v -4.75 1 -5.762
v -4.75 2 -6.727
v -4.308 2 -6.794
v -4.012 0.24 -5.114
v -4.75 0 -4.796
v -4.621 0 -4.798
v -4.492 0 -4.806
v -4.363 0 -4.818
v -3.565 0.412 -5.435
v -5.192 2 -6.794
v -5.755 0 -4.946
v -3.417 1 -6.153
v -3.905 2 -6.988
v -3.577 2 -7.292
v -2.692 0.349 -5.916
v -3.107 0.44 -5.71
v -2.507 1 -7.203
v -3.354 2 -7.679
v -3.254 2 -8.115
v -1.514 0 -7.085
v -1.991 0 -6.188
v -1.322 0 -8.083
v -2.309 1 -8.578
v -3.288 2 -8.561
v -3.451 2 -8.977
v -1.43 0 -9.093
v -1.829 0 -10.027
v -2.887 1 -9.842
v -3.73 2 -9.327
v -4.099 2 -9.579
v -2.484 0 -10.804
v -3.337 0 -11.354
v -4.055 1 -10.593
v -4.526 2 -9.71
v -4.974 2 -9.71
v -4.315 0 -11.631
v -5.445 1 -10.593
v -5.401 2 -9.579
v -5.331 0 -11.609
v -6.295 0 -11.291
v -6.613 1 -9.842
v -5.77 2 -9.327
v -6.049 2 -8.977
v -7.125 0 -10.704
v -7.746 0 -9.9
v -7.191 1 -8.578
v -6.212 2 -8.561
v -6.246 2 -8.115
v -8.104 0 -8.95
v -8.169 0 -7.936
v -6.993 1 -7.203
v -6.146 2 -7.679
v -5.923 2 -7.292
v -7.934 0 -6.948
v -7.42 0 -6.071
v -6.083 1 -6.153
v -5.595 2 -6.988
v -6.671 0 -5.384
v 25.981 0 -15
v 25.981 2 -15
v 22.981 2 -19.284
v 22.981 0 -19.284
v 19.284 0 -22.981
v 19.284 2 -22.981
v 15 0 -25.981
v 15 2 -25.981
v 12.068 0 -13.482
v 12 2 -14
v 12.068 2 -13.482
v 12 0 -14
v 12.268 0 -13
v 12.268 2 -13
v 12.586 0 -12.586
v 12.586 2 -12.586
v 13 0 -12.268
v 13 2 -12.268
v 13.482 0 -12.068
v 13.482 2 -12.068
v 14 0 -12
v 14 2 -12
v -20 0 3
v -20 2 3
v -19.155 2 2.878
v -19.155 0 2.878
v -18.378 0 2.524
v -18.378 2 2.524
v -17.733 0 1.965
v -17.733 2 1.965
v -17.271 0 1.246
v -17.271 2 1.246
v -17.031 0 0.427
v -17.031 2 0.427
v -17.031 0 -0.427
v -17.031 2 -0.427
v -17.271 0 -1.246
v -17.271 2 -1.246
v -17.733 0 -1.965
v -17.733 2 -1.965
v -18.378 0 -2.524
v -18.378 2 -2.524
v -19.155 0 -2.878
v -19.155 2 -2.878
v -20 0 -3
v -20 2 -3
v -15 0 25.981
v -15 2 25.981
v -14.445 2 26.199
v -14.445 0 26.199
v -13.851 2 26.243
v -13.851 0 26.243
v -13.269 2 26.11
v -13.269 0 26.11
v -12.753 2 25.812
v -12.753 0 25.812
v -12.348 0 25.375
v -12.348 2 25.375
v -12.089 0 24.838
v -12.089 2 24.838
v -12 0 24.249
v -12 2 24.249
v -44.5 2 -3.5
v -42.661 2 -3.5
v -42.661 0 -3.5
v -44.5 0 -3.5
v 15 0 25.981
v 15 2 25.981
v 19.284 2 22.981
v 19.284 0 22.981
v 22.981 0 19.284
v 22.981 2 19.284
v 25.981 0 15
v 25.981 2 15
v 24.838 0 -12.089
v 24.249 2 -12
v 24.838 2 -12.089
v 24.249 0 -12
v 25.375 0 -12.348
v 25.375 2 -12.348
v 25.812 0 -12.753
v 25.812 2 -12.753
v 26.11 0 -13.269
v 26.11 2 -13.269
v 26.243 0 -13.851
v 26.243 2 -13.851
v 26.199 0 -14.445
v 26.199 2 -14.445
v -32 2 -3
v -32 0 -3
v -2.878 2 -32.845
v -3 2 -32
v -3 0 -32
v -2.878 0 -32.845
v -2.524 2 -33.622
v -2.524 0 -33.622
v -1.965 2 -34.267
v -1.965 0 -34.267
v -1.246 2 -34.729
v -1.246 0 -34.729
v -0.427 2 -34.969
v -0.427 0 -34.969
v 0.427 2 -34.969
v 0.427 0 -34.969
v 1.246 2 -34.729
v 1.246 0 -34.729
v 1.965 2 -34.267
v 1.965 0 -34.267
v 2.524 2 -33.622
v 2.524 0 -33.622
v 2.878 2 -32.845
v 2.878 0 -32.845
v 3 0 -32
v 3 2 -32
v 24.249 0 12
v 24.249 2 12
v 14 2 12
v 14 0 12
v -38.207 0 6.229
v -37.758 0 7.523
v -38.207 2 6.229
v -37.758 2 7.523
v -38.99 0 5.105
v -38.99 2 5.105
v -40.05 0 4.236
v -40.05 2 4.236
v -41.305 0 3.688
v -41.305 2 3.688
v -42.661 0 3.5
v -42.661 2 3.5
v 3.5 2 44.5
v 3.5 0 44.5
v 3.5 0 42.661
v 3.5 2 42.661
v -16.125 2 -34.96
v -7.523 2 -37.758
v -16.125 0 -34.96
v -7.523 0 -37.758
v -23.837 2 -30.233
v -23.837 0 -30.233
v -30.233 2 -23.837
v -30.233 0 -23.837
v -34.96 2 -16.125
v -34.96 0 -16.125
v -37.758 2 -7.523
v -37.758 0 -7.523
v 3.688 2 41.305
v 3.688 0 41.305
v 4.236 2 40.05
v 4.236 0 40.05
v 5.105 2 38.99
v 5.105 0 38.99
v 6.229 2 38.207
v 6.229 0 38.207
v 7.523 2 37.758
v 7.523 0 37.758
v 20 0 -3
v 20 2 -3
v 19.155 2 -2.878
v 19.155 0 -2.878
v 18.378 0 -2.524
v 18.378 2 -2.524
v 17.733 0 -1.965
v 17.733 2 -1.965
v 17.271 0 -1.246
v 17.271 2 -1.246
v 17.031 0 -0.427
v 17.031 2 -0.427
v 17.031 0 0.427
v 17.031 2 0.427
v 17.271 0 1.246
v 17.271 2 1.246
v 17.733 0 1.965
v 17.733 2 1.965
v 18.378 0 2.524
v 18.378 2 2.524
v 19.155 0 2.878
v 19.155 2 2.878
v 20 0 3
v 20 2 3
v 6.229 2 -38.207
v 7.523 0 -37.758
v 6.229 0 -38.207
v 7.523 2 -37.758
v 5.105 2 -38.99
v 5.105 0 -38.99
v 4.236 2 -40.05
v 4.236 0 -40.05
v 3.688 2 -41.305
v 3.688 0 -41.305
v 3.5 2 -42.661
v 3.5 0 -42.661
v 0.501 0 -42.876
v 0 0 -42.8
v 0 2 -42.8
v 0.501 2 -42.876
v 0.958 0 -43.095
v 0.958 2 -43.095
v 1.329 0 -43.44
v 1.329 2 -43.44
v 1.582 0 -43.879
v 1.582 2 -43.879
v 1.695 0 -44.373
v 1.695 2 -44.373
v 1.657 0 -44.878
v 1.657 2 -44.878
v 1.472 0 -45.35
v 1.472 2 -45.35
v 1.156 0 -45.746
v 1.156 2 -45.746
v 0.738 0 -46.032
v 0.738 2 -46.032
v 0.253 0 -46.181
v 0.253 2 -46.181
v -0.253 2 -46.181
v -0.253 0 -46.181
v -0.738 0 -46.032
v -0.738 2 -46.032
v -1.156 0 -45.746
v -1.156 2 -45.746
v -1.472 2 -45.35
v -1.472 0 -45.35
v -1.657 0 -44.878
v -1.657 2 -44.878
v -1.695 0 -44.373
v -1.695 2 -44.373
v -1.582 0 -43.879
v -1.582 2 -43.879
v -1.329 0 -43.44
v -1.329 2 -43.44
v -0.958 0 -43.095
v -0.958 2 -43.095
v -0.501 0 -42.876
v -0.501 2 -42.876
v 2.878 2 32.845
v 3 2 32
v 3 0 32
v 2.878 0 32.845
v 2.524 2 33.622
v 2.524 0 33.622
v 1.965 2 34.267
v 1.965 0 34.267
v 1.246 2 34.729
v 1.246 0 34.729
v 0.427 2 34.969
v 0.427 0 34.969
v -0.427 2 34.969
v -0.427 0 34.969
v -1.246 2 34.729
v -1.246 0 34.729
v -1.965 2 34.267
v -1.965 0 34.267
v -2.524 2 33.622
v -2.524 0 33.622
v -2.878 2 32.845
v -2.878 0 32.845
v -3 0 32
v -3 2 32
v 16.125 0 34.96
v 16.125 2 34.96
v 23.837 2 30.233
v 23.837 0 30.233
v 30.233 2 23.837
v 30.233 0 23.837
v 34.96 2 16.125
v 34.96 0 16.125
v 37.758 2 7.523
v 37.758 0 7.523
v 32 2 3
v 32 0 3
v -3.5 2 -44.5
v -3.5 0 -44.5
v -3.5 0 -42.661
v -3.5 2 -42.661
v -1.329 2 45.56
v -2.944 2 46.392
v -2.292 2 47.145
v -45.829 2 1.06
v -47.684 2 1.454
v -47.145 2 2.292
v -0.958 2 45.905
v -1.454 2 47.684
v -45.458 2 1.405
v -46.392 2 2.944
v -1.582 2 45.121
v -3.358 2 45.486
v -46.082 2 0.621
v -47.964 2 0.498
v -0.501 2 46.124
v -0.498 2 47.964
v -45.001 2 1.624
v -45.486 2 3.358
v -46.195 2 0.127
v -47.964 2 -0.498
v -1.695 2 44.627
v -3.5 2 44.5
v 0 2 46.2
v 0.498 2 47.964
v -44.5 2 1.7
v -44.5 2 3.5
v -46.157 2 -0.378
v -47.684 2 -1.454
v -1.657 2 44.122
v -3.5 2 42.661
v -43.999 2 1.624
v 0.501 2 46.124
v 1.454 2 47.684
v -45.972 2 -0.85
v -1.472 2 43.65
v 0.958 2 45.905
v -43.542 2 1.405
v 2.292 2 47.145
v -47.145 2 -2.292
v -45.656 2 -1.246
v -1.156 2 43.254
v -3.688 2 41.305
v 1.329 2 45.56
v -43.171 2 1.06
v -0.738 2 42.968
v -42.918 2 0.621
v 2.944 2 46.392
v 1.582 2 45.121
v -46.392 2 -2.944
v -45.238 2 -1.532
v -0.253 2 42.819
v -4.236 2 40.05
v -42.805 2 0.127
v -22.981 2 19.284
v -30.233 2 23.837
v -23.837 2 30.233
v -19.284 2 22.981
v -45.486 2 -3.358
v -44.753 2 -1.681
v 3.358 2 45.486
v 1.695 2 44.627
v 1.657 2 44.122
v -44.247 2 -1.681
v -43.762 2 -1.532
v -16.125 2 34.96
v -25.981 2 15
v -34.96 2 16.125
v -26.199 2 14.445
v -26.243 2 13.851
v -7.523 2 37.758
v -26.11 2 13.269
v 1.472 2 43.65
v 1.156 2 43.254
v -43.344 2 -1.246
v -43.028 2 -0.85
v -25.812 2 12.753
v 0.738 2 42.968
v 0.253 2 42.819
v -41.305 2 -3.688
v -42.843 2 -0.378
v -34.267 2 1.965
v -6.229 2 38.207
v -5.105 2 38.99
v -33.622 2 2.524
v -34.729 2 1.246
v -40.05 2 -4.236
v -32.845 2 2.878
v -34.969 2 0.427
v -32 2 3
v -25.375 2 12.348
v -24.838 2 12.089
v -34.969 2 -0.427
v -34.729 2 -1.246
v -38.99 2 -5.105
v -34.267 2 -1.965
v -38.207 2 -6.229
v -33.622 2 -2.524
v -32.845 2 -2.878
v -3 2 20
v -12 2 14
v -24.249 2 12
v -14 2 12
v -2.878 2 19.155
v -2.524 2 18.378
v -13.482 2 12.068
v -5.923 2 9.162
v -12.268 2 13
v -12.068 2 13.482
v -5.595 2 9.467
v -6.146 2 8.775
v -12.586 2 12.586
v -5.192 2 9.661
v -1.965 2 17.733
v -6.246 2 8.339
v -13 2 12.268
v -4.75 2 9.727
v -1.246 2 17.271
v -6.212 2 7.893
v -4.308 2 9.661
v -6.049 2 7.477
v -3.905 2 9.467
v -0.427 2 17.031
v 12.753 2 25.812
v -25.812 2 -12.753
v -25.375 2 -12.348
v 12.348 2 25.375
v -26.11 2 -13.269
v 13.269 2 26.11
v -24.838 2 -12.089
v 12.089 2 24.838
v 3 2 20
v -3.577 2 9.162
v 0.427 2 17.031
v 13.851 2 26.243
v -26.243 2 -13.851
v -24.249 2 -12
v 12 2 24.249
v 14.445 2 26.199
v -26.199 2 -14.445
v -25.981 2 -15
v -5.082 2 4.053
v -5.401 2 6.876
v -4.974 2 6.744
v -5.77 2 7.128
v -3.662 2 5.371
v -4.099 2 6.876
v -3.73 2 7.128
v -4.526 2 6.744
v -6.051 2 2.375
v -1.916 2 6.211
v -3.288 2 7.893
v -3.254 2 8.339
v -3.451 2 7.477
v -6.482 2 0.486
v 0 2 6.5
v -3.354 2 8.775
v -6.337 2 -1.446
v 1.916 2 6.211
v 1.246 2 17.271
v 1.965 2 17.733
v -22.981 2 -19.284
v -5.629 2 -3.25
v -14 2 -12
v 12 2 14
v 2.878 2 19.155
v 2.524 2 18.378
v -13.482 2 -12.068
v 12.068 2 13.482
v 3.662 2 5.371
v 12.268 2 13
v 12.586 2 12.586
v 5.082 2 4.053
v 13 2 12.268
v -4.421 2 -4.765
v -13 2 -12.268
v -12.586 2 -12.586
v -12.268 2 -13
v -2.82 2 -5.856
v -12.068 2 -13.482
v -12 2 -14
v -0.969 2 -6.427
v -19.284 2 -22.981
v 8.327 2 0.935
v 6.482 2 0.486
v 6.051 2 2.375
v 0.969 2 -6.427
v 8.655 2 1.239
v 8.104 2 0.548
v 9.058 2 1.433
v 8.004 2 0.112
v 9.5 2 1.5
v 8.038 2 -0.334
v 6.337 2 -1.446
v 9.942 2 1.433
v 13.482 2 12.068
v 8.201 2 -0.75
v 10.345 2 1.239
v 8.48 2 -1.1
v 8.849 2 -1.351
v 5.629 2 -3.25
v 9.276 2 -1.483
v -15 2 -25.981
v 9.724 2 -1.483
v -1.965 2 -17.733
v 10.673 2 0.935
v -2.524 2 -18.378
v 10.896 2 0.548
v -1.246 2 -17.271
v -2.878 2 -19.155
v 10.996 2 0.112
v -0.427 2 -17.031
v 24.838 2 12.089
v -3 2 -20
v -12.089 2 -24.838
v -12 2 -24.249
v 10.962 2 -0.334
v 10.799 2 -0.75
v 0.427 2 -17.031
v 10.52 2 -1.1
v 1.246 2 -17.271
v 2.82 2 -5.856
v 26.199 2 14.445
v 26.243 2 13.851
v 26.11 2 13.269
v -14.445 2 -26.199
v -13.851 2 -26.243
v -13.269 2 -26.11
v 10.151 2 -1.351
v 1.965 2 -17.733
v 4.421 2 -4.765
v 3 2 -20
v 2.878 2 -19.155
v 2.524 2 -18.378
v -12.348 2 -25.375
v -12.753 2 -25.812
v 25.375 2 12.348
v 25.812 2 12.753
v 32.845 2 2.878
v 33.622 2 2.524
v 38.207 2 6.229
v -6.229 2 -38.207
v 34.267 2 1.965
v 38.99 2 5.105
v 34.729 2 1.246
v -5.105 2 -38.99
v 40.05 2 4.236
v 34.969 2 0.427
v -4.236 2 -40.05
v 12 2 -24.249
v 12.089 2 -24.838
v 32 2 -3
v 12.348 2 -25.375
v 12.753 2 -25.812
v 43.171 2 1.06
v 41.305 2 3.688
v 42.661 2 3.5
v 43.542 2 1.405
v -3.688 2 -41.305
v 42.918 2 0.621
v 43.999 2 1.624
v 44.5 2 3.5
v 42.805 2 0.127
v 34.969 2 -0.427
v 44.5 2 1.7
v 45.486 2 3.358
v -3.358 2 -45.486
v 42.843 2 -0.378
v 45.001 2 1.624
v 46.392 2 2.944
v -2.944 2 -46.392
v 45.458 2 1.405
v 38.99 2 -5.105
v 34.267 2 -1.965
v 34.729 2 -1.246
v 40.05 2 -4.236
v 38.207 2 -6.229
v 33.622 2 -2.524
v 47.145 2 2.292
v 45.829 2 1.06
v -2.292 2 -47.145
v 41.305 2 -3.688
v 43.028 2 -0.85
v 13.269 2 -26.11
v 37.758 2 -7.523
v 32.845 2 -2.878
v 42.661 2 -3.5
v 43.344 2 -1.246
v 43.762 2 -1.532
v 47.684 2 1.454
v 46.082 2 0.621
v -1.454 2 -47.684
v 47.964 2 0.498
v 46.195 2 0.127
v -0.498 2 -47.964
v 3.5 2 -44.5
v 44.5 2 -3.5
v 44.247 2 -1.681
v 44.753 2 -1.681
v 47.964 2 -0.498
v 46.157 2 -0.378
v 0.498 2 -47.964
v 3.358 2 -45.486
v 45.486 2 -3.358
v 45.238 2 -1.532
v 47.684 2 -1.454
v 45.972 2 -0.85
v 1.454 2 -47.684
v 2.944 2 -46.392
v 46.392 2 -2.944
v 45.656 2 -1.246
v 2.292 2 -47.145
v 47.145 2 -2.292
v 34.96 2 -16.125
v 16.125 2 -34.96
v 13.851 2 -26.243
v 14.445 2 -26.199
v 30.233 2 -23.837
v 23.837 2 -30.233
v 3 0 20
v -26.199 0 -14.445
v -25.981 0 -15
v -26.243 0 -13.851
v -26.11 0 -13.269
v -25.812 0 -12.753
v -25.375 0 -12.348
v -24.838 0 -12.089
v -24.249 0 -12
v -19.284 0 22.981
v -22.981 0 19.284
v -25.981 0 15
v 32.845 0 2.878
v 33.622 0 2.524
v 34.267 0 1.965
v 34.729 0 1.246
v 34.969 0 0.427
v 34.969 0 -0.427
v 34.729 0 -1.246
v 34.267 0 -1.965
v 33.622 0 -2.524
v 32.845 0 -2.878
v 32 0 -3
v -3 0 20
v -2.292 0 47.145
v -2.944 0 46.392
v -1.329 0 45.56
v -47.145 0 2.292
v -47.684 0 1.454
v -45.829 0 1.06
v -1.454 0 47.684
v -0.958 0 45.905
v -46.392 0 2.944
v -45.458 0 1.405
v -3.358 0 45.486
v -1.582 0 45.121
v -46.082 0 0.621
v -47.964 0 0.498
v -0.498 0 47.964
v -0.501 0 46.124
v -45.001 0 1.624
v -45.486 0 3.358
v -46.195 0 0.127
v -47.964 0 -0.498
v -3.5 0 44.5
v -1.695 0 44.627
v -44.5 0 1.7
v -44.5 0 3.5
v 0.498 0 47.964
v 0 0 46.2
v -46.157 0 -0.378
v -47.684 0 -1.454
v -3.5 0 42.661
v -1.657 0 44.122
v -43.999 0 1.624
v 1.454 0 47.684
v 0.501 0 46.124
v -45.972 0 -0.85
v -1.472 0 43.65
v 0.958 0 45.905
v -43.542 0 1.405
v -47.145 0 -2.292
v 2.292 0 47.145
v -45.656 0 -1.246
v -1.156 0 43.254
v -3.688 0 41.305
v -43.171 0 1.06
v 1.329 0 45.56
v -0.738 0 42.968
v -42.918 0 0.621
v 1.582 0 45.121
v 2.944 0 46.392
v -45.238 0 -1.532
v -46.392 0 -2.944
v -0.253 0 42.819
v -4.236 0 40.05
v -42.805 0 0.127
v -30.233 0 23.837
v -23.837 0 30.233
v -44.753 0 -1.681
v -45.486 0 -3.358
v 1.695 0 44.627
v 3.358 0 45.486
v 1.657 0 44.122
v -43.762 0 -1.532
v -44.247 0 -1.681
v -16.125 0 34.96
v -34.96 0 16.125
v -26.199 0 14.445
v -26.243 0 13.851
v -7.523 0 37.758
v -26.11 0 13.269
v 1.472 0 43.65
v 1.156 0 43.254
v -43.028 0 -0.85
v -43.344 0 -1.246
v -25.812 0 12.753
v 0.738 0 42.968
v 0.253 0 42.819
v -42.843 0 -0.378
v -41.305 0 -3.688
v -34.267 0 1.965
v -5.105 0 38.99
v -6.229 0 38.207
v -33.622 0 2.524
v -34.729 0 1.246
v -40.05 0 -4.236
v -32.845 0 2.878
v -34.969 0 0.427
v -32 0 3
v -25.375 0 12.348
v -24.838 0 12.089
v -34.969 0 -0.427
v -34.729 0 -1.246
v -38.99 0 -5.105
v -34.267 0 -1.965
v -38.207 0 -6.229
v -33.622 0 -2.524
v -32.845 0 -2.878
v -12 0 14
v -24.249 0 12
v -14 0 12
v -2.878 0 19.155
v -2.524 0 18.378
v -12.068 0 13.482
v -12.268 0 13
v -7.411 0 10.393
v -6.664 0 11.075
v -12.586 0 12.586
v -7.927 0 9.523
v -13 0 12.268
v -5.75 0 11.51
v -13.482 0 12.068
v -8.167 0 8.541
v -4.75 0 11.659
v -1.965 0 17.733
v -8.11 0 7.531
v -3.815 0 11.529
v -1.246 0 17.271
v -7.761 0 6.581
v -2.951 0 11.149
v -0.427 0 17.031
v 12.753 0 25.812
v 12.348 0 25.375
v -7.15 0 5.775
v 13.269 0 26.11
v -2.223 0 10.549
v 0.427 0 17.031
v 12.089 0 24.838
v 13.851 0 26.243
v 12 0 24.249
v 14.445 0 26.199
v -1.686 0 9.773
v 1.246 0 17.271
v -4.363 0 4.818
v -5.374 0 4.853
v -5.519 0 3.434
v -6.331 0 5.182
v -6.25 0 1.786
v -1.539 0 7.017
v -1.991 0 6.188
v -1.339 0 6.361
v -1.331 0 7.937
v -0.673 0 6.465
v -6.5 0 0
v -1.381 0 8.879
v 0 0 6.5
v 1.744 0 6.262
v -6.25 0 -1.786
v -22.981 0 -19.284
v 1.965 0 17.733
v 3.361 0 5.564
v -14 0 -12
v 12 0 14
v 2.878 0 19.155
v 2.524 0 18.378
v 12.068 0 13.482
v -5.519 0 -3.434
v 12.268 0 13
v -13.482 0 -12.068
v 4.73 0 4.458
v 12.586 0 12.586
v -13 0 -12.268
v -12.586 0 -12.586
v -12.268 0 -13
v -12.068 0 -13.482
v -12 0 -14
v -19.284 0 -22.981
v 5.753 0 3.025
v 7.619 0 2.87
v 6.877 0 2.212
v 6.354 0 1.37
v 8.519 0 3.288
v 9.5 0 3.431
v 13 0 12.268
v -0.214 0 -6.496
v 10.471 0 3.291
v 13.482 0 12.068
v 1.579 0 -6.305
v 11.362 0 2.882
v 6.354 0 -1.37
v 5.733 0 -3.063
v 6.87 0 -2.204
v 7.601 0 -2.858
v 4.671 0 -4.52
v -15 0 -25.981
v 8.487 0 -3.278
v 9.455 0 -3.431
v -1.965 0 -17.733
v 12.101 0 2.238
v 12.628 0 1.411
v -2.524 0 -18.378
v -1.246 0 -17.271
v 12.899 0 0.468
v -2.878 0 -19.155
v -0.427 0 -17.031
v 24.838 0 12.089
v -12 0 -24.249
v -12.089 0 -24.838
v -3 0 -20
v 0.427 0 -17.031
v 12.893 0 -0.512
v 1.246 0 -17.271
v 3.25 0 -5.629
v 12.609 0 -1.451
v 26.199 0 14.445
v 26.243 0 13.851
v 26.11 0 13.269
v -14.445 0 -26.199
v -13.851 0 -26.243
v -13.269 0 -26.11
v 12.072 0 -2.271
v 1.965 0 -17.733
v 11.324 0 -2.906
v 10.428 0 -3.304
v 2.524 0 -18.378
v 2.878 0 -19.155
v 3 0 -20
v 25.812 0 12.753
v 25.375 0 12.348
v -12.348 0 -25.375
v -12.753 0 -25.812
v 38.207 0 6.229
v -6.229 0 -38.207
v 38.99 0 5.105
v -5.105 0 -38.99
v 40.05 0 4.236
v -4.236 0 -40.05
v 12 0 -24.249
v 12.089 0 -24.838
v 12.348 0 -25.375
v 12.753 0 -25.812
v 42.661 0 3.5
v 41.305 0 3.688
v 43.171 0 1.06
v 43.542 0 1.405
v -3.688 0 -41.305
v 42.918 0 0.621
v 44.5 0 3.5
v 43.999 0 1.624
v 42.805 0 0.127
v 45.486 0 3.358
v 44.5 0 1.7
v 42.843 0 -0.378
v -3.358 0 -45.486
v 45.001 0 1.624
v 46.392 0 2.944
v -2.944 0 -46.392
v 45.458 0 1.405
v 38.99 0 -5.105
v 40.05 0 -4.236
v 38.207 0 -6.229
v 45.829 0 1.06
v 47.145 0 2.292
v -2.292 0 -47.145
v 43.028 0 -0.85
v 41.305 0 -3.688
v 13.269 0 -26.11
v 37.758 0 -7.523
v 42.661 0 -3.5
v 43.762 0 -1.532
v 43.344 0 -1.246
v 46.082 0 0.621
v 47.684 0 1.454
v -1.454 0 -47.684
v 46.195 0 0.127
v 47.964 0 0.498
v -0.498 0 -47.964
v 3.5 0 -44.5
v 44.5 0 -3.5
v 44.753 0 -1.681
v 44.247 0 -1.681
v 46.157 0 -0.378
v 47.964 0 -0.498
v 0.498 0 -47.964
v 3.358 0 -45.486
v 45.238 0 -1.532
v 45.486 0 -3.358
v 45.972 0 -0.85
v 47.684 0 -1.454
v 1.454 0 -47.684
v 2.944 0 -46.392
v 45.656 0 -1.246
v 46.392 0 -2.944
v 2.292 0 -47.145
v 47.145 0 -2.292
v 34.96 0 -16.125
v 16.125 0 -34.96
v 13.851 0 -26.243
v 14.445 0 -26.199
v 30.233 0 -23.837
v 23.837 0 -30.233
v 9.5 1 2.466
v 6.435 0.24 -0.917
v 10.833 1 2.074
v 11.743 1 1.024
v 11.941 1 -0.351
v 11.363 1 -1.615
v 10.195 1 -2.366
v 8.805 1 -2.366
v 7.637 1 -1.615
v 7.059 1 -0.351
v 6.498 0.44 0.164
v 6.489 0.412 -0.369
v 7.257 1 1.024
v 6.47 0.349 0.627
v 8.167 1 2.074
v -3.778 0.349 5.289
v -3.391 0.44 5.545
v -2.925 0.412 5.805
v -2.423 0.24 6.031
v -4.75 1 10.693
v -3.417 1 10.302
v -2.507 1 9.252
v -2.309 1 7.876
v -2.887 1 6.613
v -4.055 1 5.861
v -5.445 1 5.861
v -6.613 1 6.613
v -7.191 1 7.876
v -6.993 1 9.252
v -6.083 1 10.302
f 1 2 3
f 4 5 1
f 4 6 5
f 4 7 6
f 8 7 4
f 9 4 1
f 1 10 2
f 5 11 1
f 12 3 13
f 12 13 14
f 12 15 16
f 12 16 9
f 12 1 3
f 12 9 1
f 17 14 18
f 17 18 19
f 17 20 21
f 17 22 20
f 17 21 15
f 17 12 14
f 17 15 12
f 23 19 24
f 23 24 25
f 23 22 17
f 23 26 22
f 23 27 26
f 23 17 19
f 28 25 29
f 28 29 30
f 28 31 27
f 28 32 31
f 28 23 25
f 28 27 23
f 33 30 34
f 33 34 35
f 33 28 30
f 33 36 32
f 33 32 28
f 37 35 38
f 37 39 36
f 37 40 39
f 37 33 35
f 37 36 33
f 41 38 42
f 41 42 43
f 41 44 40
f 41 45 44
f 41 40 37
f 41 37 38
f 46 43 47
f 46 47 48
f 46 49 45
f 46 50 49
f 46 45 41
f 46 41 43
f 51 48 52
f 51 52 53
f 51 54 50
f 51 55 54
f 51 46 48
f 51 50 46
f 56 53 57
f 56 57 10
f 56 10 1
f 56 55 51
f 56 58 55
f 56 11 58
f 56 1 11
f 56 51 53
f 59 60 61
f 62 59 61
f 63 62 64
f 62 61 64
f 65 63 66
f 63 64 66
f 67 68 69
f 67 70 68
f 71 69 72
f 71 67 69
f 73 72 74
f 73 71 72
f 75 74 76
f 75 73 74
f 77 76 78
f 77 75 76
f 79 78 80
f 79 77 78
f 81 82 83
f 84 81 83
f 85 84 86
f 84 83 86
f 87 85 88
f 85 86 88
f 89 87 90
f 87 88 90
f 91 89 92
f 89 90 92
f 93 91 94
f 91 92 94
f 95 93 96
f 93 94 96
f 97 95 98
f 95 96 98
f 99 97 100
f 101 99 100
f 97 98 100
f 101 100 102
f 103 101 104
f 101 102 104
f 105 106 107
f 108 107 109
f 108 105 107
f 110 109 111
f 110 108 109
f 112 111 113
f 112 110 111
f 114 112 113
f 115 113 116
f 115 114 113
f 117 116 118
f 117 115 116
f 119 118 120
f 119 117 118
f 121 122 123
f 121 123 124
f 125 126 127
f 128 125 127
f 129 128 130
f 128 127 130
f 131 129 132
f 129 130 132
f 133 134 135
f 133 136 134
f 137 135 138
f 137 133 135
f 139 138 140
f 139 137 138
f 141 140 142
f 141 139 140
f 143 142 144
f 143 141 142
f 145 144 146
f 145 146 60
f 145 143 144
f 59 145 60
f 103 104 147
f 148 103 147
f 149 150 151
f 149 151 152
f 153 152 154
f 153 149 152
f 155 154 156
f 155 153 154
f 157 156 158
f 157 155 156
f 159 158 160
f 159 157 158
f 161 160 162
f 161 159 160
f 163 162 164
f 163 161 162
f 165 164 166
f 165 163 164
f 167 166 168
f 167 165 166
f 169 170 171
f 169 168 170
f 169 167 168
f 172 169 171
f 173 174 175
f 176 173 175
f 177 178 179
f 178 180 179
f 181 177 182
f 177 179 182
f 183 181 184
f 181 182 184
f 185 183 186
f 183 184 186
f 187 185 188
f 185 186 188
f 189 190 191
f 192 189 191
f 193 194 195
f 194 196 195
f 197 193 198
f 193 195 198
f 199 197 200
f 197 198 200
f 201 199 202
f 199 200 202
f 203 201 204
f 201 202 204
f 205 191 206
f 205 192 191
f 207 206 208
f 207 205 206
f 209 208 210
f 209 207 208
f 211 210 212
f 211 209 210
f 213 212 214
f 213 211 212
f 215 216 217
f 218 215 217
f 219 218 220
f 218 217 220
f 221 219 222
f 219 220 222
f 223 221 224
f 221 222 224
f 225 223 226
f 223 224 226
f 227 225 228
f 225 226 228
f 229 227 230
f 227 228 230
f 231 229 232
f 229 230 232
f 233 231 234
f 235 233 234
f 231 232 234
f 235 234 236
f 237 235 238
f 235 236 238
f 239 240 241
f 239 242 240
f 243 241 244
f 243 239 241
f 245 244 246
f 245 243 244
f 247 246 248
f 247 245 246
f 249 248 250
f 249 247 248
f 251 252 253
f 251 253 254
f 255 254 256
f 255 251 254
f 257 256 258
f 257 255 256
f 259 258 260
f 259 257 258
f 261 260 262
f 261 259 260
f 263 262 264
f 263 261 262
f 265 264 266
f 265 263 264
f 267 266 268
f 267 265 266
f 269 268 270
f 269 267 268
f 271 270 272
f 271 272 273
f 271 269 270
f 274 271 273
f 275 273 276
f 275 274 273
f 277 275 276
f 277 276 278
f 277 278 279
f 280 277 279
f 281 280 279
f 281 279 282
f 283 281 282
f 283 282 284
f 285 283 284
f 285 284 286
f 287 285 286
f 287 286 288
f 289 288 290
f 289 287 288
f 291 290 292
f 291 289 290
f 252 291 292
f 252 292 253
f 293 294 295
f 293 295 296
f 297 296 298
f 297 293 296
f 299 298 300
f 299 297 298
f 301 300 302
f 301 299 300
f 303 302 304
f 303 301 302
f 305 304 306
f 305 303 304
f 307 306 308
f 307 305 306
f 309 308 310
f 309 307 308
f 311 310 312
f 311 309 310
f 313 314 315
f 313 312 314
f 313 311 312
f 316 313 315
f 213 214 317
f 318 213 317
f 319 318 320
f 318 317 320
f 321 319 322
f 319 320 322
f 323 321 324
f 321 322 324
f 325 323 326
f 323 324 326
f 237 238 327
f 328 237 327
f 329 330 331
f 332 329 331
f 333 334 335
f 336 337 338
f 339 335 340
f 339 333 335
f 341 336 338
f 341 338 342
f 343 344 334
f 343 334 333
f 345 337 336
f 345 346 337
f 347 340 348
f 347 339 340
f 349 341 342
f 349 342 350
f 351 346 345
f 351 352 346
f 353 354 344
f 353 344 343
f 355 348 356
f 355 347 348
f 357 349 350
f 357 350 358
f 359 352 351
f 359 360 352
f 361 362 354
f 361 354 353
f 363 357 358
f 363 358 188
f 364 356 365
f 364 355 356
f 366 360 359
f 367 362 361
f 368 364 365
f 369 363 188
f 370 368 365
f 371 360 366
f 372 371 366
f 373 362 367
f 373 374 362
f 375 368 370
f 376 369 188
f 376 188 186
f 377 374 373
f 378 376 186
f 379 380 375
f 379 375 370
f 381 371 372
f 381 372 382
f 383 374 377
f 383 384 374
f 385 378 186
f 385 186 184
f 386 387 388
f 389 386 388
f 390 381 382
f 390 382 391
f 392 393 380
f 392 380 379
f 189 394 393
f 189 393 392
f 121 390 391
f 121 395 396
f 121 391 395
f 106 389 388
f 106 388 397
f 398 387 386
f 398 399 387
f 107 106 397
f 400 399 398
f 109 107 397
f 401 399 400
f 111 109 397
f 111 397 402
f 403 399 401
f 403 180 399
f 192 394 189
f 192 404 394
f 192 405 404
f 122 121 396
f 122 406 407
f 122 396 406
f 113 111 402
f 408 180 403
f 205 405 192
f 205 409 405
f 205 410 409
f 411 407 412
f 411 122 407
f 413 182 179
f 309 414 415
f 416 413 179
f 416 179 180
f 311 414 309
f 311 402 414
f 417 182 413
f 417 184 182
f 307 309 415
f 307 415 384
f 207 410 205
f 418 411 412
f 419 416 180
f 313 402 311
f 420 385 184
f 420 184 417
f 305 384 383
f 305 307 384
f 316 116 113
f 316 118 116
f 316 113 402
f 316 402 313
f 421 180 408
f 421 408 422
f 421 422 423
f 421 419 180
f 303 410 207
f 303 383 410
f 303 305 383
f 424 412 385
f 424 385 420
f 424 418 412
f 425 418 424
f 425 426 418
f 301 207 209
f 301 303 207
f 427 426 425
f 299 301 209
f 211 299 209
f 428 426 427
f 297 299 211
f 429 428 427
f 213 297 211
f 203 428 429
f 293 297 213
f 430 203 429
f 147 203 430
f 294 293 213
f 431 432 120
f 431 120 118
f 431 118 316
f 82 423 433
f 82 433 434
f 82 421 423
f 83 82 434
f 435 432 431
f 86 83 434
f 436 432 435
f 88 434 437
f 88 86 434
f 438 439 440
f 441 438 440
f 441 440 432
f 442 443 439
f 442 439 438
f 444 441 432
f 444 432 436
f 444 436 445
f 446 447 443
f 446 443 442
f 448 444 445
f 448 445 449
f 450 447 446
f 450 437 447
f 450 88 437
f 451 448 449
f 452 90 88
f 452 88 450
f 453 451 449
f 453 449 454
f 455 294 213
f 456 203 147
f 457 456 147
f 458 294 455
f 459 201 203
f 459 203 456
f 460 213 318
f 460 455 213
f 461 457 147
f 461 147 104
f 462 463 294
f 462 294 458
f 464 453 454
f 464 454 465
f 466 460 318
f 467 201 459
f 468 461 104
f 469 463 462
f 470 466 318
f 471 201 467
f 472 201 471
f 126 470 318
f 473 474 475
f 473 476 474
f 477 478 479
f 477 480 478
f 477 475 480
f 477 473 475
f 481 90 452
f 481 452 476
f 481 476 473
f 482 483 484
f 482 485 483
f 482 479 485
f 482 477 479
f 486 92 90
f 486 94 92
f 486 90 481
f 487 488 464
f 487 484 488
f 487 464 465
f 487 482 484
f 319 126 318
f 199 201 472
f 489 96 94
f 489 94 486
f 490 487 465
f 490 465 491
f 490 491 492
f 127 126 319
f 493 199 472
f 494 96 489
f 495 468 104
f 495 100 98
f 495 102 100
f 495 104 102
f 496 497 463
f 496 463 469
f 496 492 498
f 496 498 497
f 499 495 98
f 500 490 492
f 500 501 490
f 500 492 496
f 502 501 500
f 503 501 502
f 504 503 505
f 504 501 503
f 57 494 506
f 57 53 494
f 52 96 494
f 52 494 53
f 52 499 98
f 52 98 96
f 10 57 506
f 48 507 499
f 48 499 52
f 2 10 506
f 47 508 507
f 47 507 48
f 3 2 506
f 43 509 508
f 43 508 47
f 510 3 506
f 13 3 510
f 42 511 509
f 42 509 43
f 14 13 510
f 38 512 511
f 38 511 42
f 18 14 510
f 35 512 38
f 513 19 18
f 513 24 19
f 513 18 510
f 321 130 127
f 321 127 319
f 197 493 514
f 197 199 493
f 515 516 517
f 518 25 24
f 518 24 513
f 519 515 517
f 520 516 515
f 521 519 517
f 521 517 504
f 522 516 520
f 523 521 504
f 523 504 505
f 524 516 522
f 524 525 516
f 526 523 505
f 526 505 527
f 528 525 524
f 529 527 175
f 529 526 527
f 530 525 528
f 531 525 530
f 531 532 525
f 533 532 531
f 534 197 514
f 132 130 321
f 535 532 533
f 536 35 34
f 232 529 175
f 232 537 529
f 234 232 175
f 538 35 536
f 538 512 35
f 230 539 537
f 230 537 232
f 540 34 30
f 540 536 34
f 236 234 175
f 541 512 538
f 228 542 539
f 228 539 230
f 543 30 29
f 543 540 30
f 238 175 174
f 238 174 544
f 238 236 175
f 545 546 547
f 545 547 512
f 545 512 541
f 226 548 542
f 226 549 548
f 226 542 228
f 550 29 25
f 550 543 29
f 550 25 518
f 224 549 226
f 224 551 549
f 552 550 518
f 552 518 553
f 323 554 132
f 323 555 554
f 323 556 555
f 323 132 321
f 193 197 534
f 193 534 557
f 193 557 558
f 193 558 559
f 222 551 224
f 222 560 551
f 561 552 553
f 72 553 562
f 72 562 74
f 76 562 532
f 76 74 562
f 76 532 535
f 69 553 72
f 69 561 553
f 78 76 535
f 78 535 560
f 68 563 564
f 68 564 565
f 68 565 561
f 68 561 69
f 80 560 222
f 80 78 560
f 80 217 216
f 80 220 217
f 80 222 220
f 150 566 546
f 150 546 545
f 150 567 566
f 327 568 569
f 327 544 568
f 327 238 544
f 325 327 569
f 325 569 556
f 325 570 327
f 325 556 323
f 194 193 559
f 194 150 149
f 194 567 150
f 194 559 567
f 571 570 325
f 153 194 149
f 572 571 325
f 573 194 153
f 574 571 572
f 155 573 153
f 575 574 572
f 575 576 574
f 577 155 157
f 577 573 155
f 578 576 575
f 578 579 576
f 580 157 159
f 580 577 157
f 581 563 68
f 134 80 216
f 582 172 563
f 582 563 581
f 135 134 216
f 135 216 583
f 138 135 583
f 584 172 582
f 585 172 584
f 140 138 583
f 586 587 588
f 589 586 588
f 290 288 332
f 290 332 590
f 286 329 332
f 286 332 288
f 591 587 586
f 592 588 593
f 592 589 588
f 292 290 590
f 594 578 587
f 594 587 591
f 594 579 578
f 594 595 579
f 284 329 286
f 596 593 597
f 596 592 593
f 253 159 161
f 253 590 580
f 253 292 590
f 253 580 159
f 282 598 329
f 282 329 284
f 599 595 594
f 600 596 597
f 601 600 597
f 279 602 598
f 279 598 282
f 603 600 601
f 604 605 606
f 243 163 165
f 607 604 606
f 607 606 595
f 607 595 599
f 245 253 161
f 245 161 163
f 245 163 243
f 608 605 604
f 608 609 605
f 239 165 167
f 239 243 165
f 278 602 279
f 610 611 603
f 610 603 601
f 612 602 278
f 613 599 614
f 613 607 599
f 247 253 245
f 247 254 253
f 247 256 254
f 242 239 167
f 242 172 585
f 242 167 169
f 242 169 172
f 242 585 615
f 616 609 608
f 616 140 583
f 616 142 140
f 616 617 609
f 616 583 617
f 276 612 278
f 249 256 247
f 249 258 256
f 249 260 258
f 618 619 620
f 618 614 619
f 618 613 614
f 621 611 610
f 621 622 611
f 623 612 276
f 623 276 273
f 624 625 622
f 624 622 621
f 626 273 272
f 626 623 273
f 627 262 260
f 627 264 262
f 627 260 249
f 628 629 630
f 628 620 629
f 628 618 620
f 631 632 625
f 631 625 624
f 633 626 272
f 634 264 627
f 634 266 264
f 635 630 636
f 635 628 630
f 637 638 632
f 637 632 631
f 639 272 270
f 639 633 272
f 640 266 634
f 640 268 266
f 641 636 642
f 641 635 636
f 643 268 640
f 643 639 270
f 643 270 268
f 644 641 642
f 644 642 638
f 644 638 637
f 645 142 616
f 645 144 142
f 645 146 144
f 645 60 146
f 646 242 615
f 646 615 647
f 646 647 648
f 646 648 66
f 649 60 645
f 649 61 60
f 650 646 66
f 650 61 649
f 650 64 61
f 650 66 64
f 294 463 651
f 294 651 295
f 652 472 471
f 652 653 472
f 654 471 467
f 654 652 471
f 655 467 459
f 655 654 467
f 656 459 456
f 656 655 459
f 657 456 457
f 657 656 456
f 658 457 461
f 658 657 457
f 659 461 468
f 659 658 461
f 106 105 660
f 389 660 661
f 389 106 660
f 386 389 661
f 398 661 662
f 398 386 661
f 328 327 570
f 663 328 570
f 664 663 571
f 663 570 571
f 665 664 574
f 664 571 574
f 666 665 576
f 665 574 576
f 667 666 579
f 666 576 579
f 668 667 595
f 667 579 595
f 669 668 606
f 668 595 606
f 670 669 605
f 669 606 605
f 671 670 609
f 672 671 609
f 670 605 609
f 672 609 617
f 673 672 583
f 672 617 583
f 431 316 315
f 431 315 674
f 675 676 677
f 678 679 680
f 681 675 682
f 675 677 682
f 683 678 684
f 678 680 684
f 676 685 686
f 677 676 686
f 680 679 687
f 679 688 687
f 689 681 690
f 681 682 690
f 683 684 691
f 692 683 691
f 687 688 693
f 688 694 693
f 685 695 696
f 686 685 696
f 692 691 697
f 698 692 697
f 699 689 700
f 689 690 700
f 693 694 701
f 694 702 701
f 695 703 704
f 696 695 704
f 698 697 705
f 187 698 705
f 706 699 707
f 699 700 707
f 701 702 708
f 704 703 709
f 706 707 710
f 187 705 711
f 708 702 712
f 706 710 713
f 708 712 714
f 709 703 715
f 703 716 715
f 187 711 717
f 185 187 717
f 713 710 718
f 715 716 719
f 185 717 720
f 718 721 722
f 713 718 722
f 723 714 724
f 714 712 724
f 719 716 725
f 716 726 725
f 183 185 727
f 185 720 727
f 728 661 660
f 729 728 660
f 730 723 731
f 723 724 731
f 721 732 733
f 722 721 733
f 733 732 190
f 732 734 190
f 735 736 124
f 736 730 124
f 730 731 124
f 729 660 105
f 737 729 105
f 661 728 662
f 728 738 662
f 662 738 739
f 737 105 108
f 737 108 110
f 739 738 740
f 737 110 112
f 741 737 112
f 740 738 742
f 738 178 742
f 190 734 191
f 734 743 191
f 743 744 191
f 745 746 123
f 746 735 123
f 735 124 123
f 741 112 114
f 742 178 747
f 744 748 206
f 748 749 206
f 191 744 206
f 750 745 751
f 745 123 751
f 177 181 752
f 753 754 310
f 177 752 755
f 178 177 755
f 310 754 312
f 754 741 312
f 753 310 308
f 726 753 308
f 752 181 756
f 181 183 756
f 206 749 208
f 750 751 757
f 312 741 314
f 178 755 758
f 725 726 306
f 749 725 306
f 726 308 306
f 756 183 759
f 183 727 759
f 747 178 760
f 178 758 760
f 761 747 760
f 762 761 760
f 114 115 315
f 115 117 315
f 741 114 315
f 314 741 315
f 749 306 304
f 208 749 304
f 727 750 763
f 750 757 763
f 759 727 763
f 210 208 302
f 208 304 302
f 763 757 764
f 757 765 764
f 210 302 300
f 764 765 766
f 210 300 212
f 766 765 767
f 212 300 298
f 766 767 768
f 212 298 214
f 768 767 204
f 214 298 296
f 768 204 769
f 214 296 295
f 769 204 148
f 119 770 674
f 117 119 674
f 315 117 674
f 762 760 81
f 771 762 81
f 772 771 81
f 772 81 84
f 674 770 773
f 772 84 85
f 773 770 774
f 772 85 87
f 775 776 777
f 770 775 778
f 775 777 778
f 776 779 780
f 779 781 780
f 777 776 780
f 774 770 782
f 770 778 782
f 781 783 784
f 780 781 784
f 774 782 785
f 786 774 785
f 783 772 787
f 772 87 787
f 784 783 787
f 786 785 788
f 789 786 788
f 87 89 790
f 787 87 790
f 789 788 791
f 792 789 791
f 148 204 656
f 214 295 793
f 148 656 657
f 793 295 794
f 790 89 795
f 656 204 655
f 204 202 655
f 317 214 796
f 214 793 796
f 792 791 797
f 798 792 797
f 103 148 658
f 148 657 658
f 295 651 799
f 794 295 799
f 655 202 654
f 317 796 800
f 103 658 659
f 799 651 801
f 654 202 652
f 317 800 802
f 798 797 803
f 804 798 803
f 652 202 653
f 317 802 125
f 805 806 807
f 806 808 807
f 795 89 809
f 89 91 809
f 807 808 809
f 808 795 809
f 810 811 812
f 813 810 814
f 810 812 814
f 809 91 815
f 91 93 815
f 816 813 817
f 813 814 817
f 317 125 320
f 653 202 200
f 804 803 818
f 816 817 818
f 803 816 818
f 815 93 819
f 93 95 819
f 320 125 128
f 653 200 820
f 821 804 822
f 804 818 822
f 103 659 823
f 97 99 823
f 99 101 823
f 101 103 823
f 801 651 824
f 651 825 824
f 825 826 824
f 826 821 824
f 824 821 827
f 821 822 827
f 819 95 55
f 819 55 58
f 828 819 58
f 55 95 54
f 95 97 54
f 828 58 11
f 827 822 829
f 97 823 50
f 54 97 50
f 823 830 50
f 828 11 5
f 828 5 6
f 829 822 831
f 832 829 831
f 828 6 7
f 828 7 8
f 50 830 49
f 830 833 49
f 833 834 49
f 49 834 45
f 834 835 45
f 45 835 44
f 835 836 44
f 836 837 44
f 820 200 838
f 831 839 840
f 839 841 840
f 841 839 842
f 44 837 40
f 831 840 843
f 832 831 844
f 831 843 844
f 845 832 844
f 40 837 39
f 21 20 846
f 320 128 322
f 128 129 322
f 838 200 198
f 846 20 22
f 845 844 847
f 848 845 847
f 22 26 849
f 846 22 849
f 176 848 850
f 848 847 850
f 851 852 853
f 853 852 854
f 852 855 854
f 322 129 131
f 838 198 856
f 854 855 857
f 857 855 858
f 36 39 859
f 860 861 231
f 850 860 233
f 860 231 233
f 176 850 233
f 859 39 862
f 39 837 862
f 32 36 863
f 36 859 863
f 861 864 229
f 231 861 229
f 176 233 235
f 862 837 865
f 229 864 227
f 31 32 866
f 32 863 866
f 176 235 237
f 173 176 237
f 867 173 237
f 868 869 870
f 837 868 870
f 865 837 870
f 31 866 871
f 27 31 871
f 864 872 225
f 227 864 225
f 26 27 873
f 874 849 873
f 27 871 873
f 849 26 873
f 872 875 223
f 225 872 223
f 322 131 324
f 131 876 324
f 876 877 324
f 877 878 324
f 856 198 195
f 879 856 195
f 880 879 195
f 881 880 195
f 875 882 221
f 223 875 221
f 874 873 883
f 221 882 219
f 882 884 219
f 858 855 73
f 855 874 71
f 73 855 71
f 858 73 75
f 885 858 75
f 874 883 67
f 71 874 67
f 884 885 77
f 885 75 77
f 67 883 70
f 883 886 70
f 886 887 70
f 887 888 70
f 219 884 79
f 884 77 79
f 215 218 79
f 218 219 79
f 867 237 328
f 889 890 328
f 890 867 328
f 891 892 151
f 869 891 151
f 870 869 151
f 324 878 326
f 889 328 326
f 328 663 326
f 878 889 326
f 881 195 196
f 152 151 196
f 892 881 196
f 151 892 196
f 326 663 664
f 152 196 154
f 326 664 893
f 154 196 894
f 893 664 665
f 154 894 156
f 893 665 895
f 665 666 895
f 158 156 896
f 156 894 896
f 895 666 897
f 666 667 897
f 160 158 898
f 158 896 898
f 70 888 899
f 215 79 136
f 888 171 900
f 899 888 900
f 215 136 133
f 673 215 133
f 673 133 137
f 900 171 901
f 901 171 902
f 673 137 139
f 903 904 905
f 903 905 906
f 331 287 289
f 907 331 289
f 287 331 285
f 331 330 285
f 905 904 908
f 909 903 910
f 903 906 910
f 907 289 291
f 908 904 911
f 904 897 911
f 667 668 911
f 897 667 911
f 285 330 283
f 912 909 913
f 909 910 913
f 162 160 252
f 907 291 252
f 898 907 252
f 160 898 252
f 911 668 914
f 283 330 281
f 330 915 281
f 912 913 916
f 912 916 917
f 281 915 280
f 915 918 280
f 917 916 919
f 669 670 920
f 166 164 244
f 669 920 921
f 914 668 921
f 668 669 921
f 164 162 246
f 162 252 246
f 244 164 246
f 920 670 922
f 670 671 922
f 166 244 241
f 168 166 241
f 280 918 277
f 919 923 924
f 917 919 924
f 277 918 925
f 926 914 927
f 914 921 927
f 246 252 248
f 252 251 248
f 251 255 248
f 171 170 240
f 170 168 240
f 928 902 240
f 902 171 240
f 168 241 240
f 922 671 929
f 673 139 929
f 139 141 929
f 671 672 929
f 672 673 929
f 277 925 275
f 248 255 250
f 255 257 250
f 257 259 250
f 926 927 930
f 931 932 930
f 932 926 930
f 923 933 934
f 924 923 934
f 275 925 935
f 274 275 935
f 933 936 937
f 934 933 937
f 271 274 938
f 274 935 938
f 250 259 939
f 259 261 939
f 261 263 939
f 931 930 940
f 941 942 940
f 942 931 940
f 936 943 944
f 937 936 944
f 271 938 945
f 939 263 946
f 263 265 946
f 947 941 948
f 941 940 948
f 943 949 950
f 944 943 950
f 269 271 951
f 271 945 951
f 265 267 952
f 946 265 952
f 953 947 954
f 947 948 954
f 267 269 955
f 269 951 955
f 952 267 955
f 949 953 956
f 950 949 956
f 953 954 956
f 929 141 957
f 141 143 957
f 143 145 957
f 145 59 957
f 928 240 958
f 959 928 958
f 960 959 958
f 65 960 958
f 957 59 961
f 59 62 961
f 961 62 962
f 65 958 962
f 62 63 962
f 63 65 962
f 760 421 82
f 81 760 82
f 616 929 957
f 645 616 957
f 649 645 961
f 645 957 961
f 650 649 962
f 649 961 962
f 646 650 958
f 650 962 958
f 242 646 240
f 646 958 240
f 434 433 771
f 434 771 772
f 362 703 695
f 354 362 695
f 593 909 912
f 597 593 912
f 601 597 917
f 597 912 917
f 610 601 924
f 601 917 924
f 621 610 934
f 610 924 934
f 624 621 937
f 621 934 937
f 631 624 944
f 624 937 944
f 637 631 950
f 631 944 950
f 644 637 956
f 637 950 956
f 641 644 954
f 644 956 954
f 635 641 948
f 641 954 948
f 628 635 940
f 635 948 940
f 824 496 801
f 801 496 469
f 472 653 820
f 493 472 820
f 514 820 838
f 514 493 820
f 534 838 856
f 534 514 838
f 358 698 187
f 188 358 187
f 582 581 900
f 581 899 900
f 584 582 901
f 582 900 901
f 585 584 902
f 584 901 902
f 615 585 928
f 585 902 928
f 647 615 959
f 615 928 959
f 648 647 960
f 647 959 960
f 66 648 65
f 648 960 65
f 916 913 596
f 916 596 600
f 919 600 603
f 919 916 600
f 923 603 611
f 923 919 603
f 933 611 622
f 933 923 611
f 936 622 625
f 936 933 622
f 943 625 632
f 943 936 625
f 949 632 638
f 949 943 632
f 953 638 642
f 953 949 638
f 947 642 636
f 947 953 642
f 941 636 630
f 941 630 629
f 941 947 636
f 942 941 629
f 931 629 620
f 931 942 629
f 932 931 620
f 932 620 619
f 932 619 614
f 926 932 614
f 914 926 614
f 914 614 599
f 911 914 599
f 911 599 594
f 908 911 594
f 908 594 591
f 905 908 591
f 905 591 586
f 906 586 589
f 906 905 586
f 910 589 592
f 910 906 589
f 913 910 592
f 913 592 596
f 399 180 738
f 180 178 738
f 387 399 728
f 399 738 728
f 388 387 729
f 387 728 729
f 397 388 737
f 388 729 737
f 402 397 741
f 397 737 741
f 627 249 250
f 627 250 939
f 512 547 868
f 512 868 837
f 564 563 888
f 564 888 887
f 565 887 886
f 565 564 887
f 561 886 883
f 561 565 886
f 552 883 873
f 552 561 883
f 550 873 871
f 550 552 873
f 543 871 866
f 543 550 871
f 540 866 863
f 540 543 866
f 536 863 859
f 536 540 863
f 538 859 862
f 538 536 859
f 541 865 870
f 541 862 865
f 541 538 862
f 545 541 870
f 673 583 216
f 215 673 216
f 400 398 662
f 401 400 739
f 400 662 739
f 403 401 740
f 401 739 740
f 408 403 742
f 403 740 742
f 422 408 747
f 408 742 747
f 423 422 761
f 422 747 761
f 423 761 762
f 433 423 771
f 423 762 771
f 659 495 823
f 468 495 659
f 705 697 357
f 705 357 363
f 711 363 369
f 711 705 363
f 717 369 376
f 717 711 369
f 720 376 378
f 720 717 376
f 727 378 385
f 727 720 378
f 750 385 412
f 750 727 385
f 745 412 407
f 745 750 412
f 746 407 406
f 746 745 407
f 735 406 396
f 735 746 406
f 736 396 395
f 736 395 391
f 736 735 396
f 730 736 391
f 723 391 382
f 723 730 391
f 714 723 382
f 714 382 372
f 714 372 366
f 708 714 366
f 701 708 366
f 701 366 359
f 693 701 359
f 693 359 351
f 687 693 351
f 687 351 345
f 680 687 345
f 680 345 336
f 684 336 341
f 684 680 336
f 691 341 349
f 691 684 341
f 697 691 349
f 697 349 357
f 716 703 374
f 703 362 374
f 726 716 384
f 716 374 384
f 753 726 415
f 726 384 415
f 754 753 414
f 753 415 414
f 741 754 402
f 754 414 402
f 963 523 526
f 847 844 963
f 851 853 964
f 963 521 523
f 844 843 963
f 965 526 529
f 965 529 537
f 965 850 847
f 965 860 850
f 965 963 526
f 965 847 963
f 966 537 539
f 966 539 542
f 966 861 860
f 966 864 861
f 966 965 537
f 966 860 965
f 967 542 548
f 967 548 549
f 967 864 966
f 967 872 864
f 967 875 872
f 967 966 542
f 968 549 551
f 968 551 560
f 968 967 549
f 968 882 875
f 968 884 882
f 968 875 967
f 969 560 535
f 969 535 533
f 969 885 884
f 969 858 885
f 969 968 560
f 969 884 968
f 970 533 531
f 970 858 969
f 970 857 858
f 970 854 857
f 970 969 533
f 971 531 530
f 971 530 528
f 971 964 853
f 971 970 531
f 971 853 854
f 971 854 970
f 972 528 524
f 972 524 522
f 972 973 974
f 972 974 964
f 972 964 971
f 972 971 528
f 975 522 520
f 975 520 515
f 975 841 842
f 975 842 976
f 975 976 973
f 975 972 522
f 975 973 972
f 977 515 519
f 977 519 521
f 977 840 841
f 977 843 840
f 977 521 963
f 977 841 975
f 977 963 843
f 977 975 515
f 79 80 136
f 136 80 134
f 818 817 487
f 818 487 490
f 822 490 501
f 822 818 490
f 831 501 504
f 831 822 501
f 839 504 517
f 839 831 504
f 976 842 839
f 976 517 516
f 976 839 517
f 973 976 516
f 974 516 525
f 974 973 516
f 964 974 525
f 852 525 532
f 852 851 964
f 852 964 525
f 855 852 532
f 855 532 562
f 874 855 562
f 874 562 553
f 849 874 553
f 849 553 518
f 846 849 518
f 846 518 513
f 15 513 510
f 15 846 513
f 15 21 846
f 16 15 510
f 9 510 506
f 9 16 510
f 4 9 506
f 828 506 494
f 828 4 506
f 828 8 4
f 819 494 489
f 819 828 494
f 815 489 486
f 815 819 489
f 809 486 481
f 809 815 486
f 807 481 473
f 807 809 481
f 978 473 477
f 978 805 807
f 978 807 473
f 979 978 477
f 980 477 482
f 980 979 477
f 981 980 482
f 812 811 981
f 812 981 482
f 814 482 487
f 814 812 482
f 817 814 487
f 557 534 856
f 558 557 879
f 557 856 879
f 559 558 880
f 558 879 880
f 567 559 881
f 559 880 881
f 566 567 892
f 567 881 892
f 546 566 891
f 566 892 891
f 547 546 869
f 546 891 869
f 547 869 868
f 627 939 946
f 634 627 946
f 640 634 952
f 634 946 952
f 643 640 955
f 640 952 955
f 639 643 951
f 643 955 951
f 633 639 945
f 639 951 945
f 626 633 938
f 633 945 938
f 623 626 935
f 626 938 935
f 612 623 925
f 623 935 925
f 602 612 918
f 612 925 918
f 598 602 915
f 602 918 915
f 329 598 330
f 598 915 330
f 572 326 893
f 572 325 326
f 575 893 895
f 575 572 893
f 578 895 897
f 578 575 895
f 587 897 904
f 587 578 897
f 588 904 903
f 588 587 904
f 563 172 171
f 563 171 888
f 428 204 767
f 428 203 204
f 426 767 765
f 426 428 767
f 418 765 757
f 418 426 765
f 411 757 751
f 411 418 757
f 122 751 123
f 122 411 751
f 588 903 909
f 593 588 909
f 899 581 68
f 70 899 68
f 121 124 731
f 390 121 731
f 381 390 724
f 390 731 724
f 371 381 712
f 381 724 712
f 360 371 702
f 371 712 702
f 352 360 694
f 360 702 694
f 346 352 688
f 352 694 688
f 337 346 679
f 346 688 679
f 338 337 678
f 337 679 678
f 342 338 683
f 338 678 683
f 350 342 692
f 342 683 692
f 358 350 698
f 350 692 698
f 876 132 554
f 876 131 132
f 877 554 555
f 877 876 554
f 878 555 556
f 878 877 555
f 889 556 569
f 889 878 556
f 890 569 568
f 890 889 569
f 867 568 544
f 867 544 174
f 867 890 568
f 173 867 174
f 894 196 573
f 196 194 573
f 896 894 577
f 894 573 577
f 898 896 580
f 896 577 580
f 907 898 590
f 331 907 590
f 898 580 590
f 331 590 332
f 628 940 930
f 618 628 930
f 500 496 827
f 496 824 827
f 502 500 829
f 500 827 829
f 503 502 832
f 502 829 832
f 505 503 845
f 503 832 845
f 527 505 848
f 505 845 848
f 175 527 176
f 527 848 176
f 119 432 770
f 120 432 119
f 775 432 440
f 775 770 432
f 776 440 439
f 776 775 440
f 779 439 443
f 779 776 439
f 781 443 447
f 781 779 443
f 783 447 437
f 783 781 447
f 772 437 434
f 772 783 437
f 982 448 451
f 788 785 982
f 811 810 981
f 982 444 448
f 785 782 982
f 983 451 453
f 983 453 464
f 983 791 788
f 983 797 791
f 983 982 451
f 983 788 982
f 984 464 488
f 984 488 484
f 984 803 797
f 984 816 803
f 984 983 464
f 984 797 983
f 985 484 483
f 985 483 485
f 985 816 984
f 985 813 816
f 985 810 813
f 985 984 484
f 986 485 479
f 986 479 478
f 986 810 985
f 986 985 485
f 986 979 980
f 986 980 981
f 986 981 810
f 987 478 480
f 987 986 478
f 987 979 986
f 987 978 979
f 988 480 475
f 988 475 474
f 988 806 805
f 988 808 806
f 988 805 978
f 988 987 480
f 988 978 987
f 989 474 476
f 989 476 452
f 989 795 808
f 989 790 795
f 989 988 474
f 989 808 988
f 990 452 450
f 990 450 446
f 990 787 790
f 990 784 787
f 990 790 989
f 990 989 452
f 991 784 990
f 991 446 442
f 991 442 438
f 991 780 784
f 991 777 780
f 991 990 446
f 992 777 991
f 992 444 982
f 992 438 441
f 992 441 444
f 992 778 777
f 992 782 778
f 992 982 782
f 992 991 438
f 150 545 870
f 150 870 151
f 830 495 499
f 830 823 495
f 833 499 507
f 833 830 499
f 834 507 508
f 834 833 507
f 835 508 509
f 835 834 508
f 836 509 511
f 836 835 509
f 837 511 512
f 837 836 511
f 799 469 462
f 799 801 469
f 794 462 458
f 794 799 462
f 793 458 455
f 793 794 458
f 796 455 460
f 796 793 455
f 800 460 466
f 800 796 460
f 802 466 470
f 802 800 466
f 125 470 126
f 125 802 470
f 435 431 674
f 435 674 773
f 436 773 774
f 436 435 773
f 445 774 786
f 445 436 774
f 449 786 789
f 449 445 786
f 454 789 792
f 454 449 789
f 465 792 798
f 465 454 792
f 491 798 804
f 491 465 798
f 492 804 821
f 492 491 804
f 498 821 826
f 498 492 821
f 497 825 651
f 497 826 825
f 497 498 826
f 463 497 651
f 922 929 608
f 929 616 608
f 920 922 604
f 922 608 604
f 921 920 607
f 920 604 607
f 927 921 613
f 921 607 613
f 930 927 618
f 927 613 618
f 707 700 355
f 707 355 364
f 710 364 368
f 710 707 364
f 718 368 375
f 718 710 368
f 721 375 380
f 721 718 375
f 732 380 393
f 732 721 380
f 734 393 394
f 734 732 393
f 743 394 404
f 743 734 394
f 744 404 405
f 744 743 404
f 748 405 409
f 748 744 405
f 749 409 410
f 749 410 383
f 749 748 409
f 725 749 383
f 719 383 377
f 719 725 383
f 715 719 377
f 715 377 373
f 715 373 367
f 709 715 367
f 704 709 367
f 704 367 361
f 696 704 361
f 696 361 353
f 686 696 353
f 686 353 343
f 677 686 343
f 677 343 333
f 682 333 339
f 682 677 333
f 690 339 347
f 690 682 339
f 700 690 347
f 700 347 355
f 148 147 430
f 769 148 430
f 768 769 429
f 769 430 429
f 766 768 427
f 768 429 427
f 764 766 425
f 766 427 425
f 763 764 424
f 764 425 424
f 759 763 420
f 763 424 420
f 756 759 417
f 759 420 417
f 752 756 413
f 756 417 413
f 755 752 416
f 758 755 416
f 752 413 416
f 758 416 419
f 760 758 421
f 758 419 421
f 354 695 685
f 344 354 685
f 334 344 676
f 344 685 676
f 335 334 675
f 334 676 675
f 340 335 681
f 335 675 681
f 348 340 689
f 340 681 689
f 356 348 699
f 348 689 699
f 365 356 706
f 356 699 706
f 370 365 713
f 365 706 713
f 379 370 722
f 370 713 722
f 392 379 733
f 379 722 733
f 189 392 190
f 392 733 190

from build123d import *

# Parameters (mm, degrees)
SKETCH_2_R          = 38.5
SKETCH_2_R_2        = 6.5
SKETCH_2_R_3        = 1.5
EXTRUDE_1_DEPTH     = 2
CHAMFER_1_SIZE      = 2
CHAMFER_1_SIZE_2    = 1.93137755
SKETCH_3_R          = 1.7
EXTRUDE_2_DEPTH     = 2
FILLET_1_R          = 5
CUT_EXTRUDE_1_DEPTH = 10
FILLET_2_R          = 2
CUT_EXTRUDE_4_DEPTH = 10


with BuildPart() as part:
    # 草图2 → 凸台-拉伸1 (new body)
    with BuildSketch(Plane(origin=(0, 0, 0), x_dir=(1, 0, 0), z_dir=(0, 1, 0))):
        with Locations(Location((0, 0, 0), (0, 0, 270))):
            Circle(SKETCH_2_R)
        with Locations(Location((0, 0, 0), (0, 0, 270))):
            Circle(SKETCH_2_R_2, mode=Mode.SUBTRACT)
        with Locations(Location((9.5, 0, 0), (0, 0, 270))):
            Circle(SKETCH_2_R_3, mode=Mode.SUBTRACT)
        with Locations(Location((-4.75, -8.227241336, 0), (0, 0, 270))):
            Circle(SKETCH_2_R_3, mode=Mode.SUBTRACT)
        with Locations(Location((-4.75, 8.227241336, 0), (0, 0, 270))):
            Circle(SKETCH_2_R_3, mode=Mode.SUBTRACT)
    extrude(amount=EXTRUDE_1_DEPTH)

    # 倒角1
    # the kernel refuses this chamfer: 2, 1.93137755 mm, written as the material it takes off along each edge
    with BuildSketch(Plane(origin=(-4.75, 0, 8.227241336), x_dir=(0, 0, 1), z_dir=(-1, 0, 0))) as chamfer_1_piece_1:
        Polygon((1.5, CHAMFER_1_SIZE), (1.5 + CHAMFER_1_SIZE_2, 0), (1.5, 0), align=None)
    revolve(axis=Axis((-4.75, 0, 8.227241336), (0, 1, 0)), mode=Mode.SUBTRACT)
    with BuildSketch(Plane(origin=(-4.75, 0, -8.227241336), x_dir=(0, 0, 1), z_dir=(-1, 0, 0))) as chamfer_1_piece_2:
        Polygon((1.5, CHAMFER_1_SIZE), (1.5 + CHAMFER_1_SIZE_2, 0), (1.5, 0), align=None)
    revolve(axis=Axis((-4.75, 0, -8.227241336), (0, 1, 0)), mode=Mode.SUBTRACT)
    with BuildSketch(Plane(origin=(9.5, 0, 0), x_dir=(0, 0, 1), z_dir=(-1, 0, 0))) as chamfer_1_piece_3:
        Polygon((1.5, CHAMFER_1_SIZE), (1.5 + CHAMFER_1_SIZE_2, 0), (1.5, 0), align=None)
    revolve(axis=Axis((9.5, 0, 0), (0, 1, 0)), mode=Mode.SUBTRACT)

    # 草图3 → 凸台-拉伸2 (add)
    # profile 1 of 4: a face of its own
    with BuildSketch(Plane(origin=(0, 0, 0), x_dir=(1, 0, 0), z_dir=(0, 1, 0))):
        with BuildLine():
            Line((44.5, 3.5), (38.340579025, 3.5))
            ThreePointArc((38.340579025, 3.5), (38.5, 0), (38.340579025, -3.5))
            Line((38.340579025, -3.5), (44.5, -3.5))
            ThreePointArc((44.5, -3.5), (48, 0), (44.5, 3.5))
        make_face()
        with Locations(Location((44.5, 0, 0), (0, 0, 270))):
            Circle(SKETCH_3_R, mode=Mode.SUBTRACT)
    # profile 2 of 4: a face of its own
    with BuildSketch(Plane(origin=(0, 0, 0), x_dir=(1, 0, 0), z_dir=(0, 1, 0))):
        with BuildLine():
            Line((-3.5, 44.5), (-3.5, 38.340579025))
            ThreePointArc((-3.5, 38.340579025), (0, 38.5), (3.5, 38.340579025))
            Line((3.5, 38.340579025), (3.5, 44.5))
            ThreePointArc((3.5, 44.5), (0, 48), (-3.5, 44.5))
        make_face()
        with Locations(Location((0, 44.5, 0), (0, 0, 270))):
            Circle(SKETCH_3_R, mode=Mode.SUBTRACT)
    # profile 3 of 4: a face of its own
    with BuildSketch(Plane(origin=(0, 0, 0), x_dir=(1, 0, 0), z_dir=(0, 1, 0))):
        with BuildLine():
            Line((3.5, -44.5), (3.5, -38.340579025))
            ThreePointArc((3.5, -38.340579025), (0, -38.5), (-3.5, -38.340579025))
            Line((-3.5, -38.340579025), (-3.5, -44.5))
            ThreePointArc((-3.5, -44.5), (0, -48), (3.5, -44.5))
        make_face()
        with Locations(Location((0, -44.5, 0), (0, 0, 270))):
            Circle(SKETCH_3_R, mode=Mode.SUBTRACT)
    # profile 4 of 4: a face of its own
    with BuildSketch(Plane(origin=(0, 0, 0), x_dir=(1, 0, 0), z_dir=(0, 1, 0))):
        with BuildLine():
            Line((-44.5, -3.5), (-38.340579025, -3.5))
            ThreePointArc((-38.340579025, -3.5), (-38.5, 0), (-38.340579025, 3.5))
            Line((-38.340579025, 3.5), (-44.5, 3.5))
            ThreePointArc((-44.5, 3.5), (-48, 0), (-44.5, -3.5))
        make_face()
        with Locations(Location((-44.5, 0, 0), (0, 0, 270))):
            Circle(SKETCH_3_R, mode=Mode.SUBTRACT)
    extrude(amount=EXTRUDE_2_DEPTH)

    # 圆角1
    fillet_1_edges = [part.edges().sort_by_distance(p)[0] for p in [
        (38.340579025, 1, -3.5),
        (38.340579025, 1, 3.5),
        (-3.5, 1, -38.340579025),
        (3.5, 1, -38.340579025),
        (3.5, 1, 38.340579025),
        (-3.5, 1, 38.340579025),
        (-38.340579025, 1, 3.5),
        (-38.340579025, 1, -3.5),
    ]]
    fillet(fillet_1_edges, radius=FILLET_1_R)

    # 草图4 → 切除-拉伸1 (cut)
    with BuildSketch(Plane(origin=(0, 2, 0), x_dir=(1, 0, 0), z_dir=(0, 1, 0))):
        with BuildLine():
            Line((-12, 27.49545417), (-12, 12))
            Line((-12, 12), (-27.49545417, 12))
            ThreePointArc((-27.49545417, 12), (-21.213203436, 21.213203436), (-12, 27.49545417))
        make_face()
        with BuildLine():
            Line((-27.49545417, -12), (-12, -12))
            Line((-12, -12), (-12, -27.49545417))
            ThreePointArc((-12, -27.49545417), (-21.213203436, -21.213203436), (-27.49545417, -12))
        make_face()
        with BuildLine():
            Line((12, 27.49545417), (12, 12))
            Line((12, 12), (27.49545417, 12))
            ThreePointArc((27.49545417, 12), (21.213203436, 21.213203436), (12, 27.49545417))
        make_face()
        with BuildLine():
            Line((12, -12), (12, -27.49545417))
            ThreePointArc((12, -27.49545417), (21.213203436, -21.213203436), (27.49545417, -12))
            Line((27.49545417, -12), (12, -12))
        make_face()
    extrude(amount=-CUT_EXTRUDE_1_DEPTH, mode=Mode.SUBTRACT)

    # 圆角2
    fillet_2_edges = [part.edges().sort_by_distance(p)[0] for p in [
        (-12, 1, 27.49545417),
        (-27.49545417, 1, 12),
        (-12, 1, 12),
        (12, 1, -27.49545417),
        (27.49545417, 1, -12),
        (12, 1, -12),
        (27.49545417, 1, 12),
        (12, 1, 27.49545417),
        (12, 1, 12),
        (-27.49545417, 1, -12),
        (-12, 1, -27.49545417),
        (-12, 1, -12),
    ]]
    fillet(fillet_2_edges, radius=FILLET_2_R)

    # 草图5 → 切除-拉伸4 (cut)
    with BuildSketch(Plane(origin=(0, 2, 0), x_dir=(1, 0, 0), z_dir=(0, 1, 0))):
        with BuildLine():
            Line((3, 32), (3, 20))
            ThreePointArc((3, 20), (0, 17), (-3, 20))
            Line((-3, 20), (-3, 32))
            ThreePointArc((-3, 32), (0, 35), (3, 32))
        make_face()
        with BuildLine():
            Line((32, 3), (20, 3))
            ThreePointArc((20, 3), (17, 0), (20, -3))
            Line((20, -3), (32, -3))
            ThreePointArc((32, -3), (35, 0), (32, 3))
        make_face()
        with BuildLine():
            Line((-3, -32), (-3, -20))
            ThreePointArc((-3, -20), (0, -17), (3, -20))
            Line((3, -20), (3, -32))
            ThreePointArc((3, -32), (0, -35), (-3, -32))
        make_face()
        with BuildLine():
            Line((-32, -3), (-20, -3))
            ThreePointArc((-20, -3), (-17, 0), (-20, 3))
            Line((-20, 3), (-32, 3))
            ThreePointArc((-32, 3), (-35, 0), (-32, -3))
        make_face()
    extrude(amount=-CUT_EXTRUDE_4_DEPTH, mode=Mode.SUBTRACT)


solid = part.part
